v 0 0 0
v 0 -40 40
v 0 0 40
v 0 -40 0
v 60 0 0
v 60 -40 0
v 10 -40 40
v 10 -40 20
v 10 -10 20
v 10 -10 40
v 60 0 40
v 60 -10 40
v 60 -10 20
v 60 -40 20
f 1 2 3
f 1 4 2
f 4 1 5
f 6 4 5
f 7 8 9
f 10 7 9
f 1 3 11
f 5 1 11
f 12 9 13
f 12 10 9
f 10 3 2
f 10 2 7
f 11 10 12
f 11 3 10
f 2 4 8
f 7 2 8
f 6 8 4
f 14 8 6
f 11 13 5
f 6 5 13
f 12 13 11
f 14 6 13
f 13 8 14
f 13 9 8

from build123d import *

# Parameters (mm, degrees)
F0_W      = 50
F0_H      = 40
F1_DEPTH  = 40
F2_W      = 50
F2_H      = 40
F3_DEPTH  = 20
F4_W      = 10
F4_H      = 40
F5_DEPTH  = 20
F6_W      = 50
F6_H      = 10
F7_DEPTH  = 10
F8_W      = 10
F8_H      = 40
F9_DEPTH  = 20
F10_W     = 50
F10_H     = 10
F11_DEPTH = 10


with BuildPart() as f1:
    # F0 (on Front) → F1 (new body)
    with BuildSketch(Plane.XZ):
        with Locations((25, 20)):
            Rectangle(F0_W, F0_H)
    extrude(amount=F1_DEPTH)

    # F2 (on face) → F3 (cut)
    with BuildSketch(Plane.XY.offset(40)):
        with Locations((25, -20)):
            Rectangle(F2_W, F2_H)
    extrude(amount=-F3_DEPTH, mode=Mode.SUBTRACT)

    # F4 (on face) → F5 (join)
    with BuildSketch(Plane.XY.offset(20)):
        with Locations((5, -20)):
            Rectangle(F4_W, F4_H)
    extrude(amount=F5_DEPTH)

    # F6 (on face) → F7 (join)
    with BuildSketch(Plane.XY.offset(40)):
        with Locations((35, -5)):
            Rectangle(F6_W, F6_H)
    extrude(amount=-F7_DEPTH)

    # F8 (on face) → F9 (join)
    with BuildSketch(Plane.XY.offset(20)):
        with Locations((55, -20)):
            Rectangle(F8_W, F8_H)
    extrude(amount=-F9_DEPTH)

    # F10 (on face) → F11 (join)
    with BuildSketch(Plane.XZ.offset(10)):
        with Locations((35, 25)):
            Rectangle(F10_W, F10_H)
    extrude(amount=-F11_DEPTH)


solid = f1.part
